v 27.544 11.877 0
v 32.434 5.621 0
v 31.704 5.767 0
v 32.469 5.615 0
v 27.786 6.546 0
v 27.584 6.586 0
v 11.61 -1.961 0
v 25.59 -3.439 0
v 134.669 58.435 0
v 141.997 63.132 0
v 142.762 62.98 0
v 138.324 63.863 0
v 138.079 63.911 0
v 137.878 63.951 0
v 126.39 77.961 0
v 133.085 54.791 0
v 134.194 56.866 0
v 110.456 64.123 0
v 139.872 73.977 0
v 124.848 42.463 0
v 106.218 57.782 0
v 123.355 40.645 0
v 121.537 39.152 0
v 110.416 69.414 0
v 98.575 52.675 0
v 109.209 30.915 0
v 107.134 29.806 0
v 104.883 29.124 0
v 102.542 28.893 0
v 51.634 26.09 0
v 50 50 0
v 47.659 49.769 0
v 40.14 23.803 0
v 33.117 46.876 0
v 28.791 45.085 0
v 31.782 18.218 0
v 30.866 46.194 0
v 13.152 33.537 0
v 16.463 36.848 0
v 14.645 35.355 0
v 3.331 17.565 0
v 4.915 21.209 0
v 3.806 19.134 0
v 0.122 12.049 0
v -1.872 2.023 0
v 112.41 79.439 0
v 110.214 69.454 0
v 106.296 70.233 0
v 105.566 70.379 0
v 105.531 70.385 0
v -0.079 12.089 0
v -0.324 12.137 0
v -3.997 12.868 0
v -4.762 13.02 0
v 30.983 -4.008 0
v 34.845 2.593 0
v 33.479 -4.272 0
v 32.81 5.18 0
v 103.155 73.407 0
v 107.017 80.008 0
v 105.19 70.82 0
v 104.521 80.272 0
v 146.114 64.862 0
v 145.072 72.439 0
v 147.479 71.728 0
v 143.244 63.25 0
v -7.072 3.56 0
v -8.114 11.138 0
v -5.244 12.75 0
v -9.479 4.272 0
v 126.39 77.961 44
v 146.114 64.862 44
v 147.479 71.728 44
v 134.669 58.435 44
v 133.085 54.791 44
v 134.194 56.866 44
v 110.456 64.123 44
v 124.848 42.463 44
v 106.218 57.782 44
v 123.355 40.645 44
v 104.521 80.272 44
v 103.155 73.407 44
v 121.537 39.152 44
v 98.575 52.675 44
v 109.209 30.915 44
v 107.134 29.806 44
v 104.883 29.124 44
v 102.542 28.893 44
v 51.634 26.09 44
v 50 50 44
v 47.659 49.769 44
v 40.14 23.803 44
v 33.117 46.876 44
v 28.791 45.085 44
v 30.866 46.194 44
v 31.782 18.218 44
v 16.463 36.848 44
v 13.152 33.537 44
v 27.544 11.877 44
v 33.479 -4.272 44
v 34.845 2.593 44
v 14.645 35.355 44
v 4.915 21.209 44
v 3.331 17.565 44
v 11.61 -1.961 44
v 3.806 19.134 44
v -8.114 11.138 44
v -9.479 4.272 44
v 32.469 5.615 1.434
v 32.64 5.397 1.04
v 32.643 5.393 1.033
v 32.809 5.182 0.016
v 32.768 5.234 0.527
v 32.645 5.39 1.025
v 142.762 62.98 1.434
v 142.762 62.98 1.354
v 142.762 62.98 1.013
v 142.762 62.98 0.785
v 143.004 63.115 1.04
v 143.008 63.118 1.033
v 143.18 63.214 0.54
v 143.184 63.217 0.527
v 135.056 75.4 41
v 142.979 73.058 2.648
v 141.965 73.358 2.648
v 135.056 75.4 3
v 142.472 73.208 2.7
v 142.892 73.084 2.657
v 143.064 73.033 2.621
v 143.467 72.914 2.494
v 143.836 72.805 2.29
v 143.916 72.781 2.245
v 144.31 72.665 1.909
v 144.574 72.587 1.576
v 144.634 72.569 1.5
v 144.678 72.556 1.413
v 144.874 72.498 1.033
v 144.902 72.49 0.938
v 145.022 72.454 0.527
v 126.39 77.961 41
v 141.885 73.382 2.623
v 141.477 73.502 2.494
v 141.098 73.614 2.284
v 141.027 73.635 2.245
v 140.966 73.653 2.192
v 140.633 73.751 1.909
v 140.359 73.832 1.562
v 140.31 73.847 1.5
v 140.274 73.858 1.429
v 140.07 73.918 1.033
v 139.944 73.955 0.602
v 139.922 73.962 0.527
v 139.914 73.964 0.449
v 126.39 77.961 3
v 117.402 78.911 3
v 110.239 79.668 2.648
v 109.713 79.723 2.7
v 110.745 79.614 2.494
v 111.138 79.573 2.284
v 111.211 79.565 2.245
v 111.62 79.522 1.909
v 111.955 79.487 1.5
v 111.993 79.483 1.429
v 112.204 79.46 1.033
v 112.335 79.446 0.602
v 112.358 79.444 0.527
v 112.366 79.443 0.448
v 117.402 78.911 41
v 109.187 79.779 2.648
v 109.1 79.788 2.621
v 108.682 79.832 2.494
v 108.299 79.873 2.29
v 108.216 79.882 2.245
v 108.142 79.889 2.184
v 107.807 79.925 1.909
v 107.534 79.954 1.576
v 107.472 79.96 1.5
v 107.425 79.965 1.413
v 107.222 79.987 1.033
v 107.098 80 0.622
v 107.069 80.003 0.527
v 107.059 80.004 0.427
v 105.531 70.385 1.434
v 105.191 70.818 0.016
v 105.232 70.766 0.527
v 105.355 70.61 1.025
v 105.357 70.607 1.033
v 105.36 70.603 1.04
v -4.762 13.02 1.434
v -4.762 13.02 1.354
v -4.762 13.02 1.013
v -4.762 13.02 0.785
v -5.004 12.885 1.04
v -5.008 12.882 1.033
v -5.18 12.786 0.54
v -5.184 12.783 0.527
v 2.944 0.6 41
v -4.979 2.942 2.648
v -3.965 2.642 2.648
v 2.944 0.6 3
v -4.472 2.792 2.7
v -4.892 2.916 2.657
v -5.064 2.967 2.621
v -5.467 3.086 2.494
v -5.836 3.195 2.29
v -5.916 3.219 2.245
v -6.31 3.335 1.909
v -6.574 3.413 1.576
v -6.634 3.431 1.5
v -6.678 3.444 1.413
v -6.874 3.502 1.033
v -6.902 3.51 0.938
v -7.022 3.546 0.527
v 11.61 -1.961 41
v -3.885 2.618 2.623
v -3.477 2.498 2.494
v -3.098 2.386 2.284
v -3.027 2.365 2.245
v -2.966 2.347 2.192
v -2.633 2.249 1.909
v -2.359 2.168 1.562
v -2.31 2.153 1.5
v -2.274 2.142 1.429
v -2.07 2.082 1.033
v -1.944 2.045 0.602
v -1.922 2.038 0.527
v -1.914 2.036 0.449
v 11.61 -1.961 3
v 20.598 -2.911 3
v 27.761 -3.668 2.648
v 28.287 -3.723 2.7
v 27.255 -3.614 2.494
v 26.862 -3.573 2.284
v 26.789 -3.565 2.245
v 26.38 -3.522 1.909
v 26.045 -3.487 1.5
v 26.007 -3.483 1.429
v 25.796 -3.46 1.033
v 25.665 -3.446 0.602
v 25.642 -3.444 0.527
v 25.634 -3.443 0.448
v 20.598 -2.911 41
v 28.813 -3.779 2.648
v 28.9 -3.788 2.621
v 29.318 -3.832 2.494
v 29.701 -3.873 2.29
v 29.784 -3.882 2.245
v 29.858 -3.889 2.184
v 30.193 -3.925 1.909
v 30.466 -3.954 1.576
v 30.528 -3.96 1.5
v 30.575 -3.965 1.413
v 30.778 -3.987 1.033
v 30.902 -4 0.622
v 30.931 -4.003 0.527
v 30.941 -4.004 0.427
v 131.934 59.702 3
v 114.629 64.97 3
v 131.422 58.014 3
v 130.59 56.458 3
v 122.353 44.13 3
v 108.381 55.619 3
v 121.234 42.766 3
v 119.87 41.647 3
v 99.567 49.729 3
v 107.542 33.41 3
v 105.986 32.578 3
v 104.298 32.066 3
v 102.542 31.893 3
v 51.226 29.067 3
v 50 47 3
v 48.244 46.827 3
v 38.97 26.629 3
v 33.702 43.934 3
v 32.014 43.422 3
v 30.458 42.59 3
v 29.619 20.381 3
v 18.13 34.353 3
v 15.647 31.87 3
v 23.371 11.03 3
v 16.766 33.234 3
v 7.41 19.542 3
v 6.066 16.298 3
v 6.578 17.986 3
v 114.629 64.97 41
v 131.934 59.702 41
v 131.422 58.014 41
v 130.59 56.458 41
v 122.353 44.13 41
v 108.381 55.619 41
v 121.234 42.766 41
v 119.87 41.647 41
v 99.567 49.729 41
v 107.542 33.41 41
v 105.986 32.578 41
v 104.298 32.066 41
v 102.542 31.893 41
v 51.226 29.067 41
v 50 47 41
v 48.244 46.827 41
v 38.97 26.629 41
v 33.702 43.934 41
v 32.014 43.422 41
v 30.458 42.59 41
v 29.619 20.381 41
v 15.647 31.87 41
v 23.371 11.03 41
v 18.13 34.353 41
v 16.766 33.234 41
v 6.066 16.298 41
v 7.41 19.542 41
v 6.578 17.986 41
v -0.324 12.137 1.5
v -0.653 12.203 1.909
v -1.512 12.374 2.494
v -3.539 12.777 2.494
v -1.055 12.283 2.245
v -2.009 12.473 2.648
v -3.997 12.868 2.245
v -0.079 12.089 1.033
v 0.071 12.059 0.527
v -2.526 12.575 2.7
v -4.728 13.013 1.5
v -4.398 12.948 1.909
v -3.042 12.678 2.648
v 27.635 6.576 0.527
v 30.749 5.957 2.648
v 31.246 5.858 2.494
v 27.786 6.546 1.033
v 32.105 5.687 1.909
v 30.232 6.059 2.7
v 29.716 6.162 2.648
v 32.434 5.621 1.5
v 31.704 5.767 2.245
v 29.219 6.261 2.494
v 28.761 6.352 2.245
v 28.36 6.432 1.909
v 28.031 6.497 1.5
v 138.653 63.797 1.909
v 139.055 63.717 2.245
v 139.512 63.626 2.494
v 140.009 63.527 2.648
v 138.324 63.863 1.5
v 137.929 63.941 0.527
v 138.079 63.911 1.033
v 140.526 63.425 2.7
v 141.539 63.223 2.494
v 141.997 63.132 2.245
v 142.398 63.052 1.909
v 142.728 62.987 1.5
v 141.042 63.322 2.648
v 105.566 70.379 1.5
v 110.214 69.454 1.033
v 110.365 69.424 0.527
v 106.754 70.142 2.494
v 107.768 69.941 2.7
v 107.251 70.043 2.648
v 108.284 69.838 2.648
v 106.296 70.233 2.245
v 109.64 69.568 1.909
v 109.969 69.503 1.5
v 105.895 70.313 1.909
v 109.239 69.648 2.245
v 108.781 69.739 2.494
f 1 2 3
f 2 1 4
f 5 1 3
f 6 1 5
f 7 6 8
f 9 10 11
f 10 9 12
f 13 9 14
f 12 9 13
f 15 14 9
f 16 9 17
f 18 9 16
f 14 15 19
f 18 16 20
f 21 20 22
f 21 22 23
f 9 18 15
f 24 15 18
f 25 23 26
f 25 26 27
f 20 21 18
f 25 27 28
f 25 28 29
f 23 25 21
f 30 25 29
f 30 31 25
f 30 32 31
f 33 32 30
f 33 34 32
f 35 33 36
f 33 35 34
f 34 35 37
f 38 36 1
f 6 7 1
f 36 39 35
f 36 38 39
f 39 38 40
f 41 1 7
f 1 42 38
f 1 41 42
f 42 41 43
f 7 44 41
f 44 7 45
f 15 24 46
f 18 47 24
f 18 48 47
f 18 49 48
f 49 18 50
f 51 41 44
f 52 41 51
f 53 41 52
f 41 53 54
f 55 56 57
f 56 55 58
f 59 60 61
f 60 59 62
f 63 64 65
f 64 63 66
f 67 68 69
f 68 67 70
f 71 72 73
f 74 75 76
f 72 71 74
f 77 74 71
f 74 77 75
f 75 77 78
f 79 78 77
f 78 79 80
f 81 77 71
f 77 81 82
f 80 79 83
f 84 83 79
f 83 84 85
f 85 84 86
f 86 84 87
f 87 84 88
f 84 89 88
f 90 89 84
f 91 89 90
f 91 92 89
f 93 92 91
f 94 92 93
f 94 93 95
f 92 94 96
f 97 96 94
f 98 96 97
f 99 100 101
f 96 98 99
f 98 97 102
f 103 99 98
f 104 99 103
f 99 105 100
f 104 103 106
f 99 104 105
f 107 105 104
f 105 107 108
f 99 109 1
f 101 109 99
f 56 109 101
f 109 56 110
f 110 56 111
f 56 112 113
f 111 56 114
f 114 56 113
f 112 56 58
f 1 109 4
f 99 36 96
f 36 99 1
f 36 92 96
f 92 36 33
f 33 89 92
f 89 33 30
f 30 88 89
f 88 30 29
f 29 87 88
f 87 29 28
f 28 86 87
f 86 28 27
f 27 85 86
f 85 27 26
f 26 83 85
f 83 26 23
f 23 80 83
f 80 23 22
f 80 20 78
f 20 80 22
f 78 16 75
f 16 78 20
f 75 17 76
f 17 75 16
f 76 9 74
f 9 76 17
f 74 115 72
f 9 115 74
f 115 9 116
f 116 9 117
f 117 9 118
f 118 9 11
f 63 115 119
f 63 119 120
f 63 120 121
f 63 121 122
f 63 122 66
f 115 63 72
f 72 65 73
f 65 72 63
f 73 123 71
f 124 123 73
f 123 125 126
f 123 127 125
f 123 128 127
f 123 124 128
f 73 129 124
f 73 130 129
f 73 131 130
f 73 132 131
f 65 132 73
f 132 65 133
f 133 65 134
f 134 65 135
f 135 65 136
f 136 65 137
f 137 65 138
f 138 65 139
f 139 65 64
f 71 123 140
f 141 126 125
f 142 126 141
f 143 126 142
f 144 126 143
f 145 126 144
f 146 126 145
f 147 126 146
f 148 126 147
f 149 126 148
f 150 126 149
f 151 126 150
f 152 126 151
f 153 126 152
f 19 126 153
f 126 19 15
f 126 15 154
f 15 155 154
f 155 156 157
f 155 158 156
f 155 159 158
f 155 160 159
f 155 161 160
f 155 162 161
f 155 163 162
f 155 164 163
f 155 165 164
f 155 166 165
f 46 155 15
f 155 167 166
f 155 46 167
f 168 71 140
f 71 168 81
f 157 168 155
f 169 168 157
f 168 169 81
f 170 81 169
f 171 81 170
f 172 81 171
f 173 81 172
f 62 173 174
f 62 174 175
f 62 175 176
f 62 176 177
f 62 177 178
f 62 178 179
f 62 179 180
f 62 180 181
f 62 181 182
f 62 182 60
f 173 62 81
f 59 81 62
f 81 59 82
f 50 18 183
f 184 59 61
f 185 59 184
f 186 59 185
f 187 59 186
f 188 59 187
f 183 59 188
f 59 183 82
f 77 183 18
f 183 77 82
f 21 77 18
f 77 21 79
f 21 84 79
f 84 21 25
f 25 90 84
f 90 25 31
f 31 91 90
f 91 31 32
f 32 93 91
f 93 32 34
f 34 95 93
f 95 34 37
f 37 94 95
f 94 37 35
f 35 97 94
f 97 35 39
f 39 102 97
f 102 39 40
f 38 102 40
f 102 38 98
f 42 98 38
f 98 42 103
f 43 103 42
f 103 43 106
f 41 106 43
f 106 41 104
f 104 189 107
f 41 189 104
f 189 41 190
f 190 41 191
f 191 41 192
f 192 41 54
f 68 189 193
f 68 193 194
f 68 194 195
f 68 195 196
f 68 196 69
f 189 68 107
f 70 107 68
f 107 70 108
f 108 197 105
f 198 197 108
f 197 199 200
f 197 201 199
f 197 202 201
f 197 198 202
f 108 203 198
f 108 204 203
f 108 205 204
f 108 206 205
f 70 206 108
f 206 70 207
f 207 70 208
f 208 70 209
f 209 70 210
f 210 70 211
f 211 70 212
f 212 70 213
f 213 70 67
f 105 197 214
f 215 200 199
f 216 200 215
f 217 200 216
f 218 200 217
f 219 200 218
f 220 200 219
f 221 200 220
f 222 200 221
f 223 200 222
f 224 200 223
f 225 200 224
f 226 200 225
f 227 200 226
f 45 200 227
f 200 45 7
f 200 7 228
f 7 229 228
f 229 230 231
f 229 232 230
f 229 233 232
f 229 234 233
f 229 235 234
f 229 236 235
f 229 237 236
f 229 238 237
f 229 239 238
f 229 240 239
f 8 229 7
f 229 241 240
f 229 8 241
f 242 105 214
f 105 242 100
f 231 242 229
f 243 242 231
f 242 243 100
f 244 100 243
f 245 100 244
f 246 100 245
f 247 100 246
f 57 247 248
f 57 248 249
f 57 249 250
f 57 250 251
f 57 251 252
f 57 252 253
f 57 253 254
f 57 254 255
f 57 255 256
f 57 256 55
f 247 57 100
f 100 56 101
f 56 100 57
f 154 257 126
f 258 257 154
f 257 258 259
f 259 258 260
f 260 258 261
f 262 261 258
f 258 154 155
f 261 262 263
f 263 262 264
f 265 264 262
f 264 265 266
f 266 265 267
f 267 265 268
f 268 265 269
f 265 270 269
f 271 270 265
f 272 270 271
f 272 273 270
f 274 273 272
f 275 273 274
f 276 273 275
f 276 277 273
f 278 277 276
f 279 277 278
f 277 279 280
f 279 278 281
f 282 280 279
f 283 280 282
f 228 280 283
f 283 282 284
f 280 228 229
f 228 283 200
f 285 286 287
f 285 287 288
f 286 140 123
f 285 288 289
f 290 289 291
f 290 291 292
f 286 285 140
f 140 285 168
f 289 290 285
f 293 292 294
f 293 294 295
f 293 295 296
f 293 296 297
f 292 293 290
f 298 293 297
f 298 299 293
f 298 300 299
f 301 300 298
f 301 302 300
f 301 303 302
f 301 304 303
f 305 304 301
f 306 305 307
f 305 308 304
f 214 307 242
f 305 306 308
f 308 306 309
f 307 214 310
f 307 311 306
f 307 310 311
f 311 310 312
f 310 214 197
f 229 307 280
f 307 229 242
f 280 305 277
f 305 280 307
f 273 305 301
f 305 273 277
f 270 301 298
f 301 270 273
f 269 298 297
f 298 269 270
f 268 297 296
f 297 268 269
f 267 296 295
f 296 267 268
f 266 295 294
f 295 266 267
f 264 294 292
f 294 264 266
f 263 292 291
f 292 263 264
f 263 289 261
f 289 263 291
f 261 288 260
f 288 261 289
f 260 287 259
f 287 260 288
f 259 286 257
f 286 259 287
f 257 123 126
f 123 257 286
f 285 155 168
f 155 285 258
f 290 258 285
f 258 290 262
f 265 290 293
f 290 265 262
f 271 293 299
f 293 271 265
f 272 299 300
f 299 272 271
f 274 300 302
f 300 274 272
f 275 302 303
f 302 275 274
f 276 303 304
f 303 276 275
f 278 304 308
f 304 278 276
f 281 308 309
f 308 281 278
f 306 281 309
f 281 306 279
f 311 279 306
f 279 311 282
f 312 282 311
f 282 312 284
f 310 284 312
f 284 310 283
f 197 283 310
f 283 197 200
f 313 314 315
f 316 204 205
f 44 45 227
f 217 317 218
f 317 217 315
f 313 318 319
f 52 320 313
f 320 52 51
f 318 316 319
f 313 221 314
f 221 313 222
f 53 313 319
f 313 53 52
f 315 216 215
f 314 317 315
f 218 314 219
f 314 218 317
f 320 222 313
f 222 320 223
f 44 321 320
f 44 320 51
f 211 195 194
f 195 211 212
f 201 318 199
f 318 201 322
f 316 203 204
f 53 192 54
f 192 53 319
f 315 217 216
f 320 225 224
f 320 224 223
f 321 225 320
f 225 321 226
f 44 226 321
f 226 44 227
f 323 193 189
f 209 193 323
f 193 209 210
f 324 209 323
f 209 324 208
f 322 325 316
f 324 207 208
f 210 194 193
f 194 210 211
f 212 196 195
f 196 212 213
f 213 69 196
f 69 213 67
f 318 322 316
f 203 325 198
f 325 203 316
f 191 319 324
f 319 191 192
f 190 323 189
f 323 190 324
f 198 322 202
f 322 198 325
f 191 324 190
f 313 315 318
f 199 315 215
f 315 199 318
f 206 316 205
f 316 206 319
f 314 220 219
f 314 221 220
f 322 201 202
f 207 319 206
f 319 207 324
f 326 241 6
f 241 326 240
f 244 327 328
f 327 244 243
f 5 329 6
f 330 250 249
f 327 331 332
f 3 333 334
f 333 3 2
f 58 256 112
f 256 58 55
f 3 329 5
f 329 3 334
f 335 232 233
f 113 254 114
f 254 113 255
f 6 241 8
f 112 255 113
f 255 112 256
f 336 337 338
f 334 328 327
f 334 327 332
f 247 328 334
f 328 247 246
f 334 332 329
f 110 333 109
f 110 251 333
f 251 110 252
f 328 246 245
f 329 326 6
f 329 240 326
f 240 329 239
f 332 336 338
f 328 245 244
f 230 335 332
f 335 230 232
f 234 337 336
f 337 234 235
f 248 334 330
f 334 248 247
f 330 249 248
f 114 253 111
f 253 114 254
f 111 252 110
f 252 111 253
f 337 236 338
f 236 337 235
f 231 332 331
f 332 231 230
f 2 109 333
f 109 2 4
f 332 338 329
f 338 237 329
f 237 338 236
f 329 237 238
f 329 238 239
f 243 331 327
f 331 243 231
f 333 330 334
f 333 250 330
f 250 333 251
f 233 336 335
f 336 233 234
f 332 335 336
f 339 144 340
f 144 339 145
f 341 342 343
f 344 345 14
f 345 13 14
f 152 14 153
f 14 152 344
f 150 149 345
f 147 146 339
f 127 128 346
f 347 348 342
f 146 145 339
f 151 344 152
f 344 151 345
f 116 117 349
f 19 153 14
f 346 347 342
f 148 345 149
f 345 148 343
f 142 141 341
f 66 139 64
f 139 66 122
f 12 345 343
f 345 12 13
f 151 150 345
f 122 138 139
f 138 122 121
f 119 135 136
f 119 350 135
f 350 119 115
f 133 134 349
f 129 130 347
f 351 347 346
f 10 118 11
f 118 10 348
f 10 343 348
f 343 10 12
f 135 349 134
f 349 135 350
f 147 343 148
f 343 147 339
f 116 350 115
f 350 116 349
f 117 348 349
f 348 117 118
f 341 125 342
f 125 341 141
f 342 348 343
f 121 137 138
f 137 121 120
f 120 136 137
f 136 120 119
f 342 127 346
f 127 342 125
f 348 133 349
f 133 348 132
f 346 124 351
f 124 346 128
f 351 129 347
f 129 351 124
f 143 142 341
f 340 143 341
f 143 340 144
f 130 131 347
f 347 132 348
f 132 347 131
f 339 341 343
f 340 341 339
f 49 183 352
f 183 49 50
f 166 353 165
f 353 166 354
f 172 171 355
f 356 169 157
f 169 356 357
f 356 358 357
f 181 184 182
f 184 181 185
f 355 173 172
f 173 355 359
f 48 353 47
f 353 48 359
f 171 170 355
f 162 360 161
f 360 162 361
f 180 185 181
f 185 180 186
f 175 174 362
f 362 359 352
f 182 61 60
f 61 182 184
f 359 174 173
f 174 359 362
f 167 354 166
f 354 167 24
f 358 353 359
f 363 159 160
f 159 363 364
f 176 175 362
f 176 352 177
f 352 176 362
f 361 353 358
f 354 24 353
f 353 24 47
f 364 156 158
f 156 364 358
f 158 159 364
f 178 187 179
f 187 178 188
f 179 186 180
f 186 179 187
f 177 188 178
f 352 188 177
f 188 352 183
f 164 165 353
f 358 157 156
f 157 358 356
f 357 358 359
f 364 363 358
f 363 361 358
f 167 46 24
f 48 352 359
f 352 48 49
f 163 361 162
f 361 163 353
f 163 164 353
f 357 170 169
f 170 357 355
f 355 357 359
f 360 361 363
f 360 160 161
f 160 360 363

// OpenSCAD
$fn = 32;

// ----------------------------------------------------------------------
// Air duct: 24 mm duct, 3 mm wall, 44 mm across
// ----------------------------------------------------------------------

// --- parameters (mm) ---
duct_r = 12;              // duct core radius
duct_d = 24;              // duct core diameter
wall = 3;                 // duct wall thickness
height = 44;              // duct width (extrusion height)
port_r = 21.9;            // port flange half width
port_d = 43.8;            // port flange width
port_t = 7;               // port flange thickness
bolt_d = 5.4;             // port bolt holes
bolt_offset = 16.7;       // bolt hole offset from the port axis

difference() {
  /* outer hull chain: tube with a flat flange plate at every port */
  linear_extrude(height = 44) {
    hull() {
      polygon([[33.479, -4.272], [-9.479, 4.272], [-8.114, 11.138], [34.845, 2.593]]);
      translate([13.951, 9.808]) circle(r = 12);
    }
    hull() {
      translate([13.951, 9.808]) circle(r = 12);
      translate([14.893, 14.542]) circle(r = 12);
    }
    hull() {
      translate([14.893, 14.542]) circle(r = 12);
      translate([23.13, 26.87]) circle(r = 12);
    }
    hull() {
      translate([23.13, 26.87]) circle(r = 12);
      translate([35.458, 35.107]) circle(r = 12);
    }
    hull() {
      translate([35.458, 35.107]) circle(r = 12);
      translate([50, 38]) circle(r = 12);
    }
    hull() {
      translate([50, 38]) circle(r = 12);
      translate([102.542, 40.893]) circle(r = 12);
    }
    hull() {
      translate([102.542, 40.893]) circle(r = 12);
      translate([114.87, 49.13]) circle(r = 12);
    }
    hull() {
      translate([114.87, 49.13]) circle(r = 12);
      translate([123.107, 61.458]) circle(r = 12);
    }
    hull() {
      translate([123.107, 61.458]) circle(r = 12);
      translate([124.049, 66.192]) circle(r = 12);
    }
    hull() {
      translate([124.049, 66.192]) circle(r = 12);
      polygon([[104.521, 80.272], [147.479, 71.728], [146.114, 64.862], [103.155, 73.407]]);
    }
  }
  /* air passage: the same chain inset by the wall, 5 mm proud of the ports */
  translate([0, 0, 3]) linear_extrude(height = 38) {
    hull() {
      translate([11.025, -4.904]) circle(r = 9);
      translate([14.893, 14.542]) circle(r = 9);
    }
    hull() {
      translate([14.893, 14.542]) circle(r = 9);
      translate([23.13, 26.87]) circle(r = 9);
    }
    hull() {
      translate([23.13, 26.87]) circle(r = 9);
      translate([35.458, 35.107]) circle(r = 9);
    }
    hull() {
      translate([35.458, 35.107]) circle(r = 9);
      translate([50, 38]) circle(r = 9);
    }
    hull() {
      translate([50, 38]) circle(r = 9);
      translate([102.542, 40.893]) circle(r = 9);
    }
    hull() {
      translate([102.542, 40.893]) circle(r = 9);
      translate([114.87, 49.13]) circle(r = 9);
    }
    hull() {
      translate([114.87, 49.13]) circle(r = 9);
      translate([123.107, 61.458]) circle(r = 9);
    }
    hull() {
      translate([123.107, 61.458]) circle(r = 9);
      translate([126.975, 80.904]) circle(r = 9);
    }
  }
  translate([12, 0]) rotate([0, 0, -11.25]) translate([-16.7, -2.5]) rotate([-90, 0, 0]) cylinder(h = 12, d = 5.4);
  translate([12, 0]) rotate([0, 0, -11.25]) translate([16.7, -2.5]) rotate([-90, 0, 0]) cylinder(h = 12, d = 5.4);
  translate([126, 76]) rotate([0, 0, 168.75]) translate([-16.7, -2.5]) rotate([-90, 0, 0]) cylinder(h = 12, d = 5.4);
  translate([126, 76]) rotate([0, 0, 168.75]) translate([16.7, -2.5]) rotate([-90, 0, 0]) cylinder(h = 12, d = 5.4);
}
